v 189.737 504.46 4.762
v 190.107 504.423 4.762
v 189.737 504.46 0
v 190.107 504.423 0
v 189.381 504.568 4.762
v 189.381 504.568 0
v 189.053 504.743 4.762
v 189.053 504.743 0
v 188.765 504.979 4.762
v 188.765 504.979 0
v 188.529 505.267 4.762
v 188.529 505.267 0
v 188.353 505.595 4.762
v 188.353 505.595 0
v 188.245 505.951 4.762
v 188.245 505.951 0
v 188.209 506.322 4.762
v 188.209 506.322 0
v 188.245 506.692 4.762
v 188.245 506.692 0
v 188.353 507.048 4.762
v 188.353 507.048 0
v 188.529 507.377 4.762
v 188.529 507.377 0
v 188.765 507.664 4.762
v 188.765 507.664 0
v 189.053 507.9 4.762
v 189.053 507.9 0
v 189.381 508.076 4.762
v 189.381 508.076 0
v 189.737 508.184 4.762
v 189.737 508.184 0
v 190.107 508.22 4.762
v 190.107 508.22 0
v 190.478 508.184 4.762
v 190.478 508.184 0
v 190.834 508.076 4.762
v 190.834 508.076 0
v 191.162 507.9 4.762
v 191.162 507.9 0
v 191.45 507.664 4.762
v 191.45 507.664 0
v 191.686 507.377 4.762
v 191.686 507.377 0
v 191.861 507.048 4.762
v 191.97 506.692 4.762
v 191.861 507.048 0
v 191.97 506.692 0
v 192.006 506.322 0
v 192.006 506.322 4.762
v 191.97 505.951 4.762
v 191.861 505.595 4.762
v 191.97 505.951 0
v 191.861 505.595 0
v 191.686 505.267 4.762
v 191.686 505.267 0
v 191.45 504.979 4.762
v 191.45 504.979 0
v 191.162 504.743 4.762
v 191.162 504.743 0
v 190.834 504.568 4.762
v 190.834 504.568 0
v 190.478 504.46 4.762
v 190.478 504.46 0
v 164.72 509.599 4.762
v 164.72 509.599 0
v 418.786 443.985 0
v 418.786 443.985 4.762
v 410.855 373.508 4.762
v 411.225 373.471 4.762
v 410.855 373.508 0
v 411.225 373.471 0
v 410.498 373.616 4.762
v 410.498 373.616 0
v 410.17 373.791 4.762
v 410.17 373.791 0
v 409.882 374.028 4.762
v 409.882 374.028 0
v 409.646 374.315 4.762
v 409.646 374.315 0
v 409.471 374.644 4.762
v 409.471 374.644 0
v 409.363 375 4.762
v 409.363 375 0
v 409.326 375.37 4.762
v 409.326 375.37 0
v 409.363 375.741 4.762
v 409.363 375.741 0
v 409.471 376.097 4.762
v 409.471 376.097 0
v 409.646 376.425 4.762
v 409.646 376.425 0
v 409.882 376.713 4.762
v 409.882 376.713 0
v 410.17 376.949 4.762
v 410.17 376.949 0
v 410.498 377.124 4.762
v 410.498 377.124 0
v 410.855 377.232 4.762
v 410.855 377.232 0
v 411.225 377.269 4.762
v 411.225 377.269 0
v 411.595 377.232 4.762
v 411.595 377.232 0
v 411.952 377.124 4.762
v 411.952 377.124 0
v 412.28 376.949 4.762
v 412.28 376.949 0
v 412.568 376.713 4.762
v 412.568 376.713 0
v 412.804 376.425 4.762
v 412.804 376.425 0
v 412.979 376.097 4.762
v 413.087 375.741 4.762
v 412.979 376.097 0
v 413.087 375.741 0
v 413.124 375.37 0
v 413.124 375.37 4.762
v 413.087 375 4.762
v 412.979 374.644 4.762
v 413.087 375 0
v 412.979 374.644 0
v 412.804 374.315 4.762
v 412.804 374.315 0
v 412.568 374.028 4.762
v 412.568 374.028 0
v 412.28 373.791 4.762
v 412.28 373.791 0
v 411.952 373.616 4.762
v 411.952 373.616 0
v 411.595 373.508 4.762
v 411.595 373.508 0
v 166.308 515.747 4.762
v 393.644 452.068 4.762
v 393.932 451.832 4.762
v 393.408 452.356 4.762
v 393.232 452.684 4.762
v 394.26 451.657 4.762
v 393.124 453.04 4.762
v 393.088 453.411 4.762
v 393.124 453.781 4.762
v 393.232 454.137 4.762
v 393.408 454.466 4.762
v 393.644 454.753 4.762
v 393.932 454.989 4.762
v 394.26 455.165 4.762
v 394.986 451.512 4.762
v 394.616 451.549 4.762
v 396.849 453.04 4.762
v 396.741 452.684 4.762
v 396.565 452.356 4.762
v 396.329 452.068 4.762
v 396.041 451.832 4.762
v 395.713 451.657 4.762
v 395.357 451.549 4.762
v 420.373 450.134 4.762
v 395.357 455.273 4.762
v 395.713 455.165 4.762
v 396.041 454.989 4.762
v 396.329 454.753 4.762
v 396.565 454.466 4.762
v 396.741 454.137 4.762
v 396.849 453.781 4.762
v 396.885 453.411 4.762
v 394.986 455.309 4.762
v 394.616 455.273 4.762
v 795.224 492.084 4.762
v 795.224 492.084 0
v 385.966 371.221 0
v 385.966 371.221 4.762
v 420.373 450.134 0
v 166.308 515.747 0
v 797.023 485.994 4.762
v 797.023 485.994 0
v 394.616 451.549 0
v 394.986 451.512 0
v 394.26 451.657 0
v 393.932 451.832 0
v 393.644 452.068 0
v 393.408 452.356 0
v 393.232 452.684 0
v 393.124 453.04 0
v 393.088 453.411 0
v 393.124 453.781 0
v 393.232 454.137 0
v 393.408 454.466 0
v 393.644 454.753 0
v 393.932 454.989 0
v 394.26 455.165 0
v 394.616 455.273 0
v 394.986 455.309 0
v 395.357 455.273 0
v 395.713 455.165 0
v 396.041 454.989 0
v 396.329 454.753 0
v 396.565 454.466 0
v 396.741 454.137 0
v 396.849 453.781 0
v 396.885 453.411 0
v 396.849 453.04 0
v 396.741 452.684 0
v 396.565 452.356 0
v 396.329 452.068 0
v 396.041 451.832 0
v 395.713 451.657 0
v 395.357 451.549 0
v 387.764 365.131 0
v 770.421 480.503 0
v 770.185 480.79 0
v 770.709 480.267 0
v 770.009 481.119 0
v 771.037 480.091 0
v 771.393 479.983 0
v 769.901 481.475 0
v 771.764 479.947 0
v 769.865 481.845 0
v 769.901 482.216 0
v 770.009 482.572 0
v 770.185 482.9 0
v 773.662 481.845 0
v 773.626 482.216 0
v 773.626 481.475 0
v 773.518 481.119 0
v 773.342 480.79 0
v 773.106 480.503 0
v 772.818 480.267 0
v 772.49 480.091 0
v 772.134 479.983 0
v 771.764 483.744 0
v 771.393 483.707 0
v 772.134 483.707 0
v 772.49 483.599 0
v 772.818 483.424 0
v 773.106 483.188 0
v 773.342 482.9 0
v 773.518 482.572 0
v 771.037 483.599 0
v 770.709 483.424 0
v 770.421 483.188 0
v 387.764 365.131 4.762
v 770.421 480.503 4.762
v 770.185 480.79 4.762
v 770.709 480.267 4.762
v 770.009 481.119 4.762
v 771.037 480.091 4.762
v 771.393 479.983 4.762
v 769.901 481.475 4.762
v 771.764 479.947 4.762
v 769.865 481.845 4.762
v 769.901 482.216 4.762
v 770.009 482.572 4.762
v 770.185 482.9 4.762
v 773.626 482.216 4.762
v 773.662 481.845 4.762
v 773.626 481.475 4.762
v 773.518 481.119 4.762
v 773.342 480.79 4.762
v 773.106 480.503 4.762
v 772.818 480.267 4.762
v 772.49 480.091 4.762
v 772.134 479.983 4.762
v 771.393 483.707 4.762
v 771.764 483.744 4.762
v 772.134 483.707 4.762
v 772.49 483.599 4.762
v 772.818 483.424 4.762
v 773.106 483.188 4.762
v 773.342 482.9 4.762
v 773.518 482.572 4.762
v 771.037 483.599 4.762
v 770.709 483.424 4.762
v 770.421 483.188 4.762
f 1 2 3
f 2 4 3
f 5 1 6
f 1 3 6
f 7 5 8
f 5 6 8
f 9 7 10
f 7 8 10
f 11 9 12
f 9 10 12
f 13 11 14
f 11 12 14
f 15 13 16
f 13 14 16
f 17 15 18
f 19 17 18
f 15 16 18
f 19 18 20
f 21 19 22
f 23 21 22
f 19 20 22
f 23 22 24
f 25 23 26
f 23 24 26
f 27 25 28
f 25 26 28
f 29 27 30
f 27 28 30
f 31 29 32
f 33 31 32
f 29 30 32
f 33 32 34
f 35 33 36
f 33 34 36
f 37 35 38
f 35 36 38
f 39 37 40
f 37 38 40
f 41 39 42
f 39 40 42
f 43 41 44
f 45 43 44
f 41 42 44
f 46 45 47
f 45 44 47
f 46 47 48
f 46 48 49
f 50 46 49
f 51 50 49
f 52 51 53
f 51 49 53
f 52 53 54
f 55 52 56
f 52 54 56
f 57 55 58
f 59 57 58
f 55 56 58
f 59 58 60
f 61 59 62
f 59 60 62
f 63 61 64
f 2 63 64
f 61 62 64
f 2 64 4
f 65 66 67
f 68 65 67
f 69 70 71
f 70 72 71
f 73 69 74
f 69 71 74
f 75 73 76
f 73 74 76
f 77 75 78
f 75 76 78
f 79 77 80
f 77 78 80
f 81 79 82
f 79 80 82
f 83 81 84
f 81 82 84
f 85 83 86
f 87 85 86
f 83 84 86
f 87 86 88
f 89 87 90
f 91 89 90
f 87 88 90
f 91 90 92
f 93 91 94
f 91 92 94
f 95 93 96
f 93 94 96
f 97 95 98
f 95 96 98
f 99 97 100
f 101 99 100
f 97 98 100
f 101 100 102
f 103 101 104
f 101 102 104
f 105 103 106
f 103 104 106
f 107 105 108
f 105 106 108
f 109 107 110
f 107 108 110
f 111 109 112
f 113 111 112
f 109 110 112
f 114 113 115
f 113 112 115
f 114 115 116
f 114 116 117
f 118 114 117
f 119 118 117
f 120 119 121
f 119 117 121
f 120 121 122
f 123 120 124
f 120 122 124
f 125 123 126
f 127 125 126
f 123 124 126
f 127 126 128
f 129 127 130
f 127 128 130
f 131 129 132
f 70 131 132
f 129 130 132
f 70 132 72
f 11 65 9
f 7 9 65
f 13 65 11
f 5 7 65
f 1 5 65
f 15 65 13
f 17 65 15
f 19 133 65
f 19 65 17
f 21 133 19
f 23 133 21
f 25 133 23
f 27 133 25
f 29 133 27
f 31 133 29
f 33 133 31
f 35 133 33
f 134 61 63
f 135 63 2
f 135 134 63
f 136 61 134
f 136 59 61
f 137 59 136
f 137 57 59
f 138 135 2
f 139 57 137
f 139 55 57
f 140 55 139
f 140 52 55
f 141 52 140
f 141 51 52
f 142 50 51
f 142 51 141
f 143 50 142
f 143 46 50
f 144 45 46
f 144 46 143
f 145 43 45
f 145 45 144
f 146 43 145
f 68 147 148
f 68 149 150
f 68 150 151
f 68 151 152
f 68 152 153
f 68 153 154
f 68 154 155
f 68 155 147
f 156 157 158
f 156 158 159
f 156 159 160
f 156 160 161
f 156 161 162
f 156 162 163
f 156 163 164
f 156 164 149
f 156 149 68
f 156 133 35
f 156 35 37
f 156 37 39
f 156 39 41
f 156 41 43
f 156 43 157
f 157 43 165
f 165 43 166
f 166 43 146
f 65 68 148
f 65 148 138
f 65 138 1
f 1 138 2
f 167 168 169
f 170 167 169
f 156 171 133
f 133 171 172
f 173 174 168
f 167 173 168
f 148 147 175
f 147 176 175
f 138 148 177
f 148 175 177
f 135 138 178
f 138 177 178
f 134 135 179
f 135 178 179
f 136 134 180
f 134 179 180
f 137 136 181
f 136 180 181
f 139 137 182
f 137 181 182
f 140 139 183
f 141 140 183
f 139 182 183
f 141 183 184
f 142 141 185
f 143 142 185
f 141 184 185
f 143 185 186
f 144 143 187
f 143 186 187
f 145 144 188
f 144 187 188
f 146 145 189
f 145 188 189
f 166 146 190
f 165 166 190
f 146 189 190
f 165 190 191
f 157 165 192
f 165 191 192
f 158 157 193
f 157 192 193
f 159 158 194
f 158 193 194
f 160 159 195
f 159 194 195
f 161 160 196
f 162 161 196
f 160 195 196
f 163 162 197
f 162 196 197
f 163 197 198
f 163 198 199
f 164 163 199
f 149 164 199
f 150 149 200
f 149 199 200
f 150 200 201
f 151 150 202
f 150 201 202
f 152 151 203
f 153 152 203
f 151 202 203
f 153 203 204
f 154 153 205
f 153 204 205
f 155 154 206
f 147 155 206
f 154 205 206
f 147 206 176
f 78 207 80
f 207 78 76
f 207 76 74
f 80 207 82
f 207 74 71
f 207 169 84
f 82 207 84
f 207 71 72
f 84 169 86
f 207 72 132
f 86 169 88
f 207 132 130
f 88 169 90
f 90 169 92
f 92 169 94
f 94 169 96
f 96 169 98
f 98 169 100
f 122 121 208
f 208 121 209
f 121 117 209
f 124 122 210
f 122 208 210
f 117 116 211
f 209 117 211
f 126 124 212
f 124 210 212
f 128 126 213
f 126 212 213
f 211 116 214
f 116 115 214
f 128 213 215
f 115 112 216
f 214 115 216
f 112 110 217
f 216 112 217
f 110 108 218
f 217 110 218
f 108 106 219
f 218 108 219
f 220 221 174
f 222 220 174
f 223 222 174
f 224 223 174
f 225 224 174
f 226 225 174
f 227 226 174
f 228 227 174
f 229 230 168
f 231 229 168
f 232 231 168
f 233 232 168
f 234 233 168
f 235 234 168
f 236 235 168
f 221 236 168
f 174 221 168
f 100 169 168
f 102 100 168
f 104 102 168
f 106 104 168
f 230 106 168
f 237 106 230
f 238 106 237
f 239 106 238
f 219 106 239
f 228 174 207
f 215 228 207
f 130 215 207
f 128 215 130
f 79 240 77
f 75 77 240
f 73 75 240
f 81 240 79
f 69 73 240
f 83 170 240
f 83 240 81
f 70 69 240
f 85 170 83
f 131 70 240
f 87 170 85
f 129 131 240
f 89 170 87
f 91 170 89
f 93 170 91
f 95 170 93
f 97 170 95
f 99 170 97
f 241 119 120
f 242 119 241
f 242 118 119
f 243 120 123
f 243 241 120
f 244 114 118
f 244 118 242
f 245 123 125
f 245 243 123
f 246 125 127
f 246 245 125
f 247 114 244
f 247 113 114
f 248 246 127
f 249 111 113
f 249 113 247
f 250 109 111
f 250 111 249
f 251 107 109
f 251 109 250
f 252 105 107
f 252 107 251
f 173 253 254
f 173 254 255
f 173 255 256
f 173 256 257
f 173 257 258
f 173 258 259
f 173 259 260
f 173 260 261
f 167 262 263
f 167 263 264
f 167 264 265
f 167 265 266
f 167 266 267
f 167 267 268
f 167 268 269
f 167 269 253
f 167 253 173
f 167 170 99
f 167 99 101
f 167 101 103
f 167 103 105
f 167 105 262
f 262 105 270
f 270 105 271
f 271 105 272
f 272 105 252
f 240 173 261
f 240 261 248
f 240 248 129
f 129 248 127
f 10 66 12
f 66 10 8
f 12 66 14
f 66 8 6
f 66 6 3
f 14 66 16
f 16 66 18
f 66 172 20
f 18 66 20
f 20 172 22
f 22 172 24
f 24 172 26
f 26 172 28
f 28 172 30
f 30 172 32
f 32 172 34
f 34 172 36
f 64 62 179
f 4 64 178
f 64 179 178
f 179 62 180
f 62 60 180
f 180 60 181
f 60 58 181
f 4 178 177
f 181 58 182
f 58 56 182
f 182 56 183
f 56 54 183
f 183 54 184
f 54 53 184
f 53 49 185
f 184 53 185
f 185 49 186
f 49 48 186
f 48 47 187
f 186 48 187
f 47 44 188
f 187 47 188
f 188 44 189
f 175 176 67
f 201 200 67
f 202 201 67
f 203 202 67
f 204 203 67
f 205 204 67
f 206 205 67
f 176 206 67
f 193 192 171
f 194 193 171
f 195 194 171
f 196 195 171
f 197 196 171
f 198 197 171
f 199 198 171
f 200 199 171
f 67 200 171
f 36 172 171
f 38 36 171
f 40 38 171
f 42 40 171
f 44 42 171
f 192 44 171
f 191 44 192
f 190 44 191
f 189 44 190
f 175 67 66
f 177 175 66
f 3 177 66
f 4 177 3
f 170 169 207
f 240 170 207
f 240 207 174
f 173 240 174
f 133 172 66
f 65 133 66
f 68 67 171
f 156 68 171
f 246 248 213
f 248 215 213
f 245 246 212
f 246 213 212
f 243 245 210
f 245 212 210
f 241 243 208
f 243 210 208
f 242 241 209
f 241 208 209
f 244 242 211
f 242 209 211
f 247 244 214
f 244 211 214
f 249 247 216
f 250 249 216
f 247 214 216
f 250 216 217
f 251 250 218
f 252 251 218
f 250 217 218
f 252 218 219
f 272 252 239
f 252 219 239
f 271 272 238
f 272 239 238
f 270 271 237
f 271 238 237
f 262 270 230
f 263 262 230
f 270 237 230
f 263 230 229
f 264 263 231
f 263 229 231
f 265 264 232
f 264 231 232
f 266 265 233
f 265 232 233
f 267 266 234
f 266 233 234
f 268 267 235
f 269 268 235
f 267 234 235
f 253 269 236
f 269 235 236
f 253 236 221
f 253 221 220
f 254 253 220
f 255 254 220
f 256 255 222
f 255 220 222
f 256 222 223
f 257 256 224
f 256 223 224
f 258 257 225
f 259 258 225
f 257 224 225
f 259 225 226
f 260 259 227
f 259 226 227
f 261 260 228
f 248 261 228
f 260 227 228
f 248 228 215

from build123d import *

# Parameters (mm, degrees)
BOSS_EXTRUDE1_DEPTH            = 4.7625
BOSS_EXTRUDE1_2_DEPTH          = 4.7625
SKETCH6_W                      = 1.89865
SKETCH6_H                      = 4.7625
F_6_CLEARANCE_HOLE1_AT_2_COUNT = 2
F_6_CLEARANCE_HOLE1_AT_2_PITCH = 377.84858633
F_6_CLEARANCE_HOLE1_AT_3_COUNT = 2
F_6_CLEARANCE_HOLE1_AT_3_PITCH = 582.170968688
F_6_CLEARANCE_HOLE1_AT_4_COUNT = 2
F_6_CLEARANCE_HOLE1_AT_4_PITCH = 375.932176835


with BuildPart() as part:
    # Sketch4 → Boss-Extrude1 (new body)
    with BuildSketch(Plane.XY):
        Polygon((420.373410583, 450.13359804), (166.308154013, 515.747181299), (164.720331493, 509.598903521), (418.785588063, 443.985320261), align=None)
    extrude(amount=BOSS_EXTRUDE1_DEPTH)


with BuildPart() as body_2:
    # Sketch4 → Boss-Extrude1 2 (new body)
    with BuildSketch(Plane.XY):
        Polygon((795.224225991, 492.084261956), (385.965820385, 371.221082339), (387.764328284, 365.131101277), (797.022733889, 485.994280894), align=None)
    extrude(amount=BOSS_EXTRUDE1_2_DEPTH)

    # Sketch6 → #6 Clearance Hole1 (revolve, cut)
    with BuildSketch(Plane(origin=(771.763555691, 481.845239831, 4.7625), x_dir=(0, -1, 0), z_dir=(1, 0, 0))):
        with Locations((0.949325, 2.38125)):
            Rectangle(SKETCH6_W, SKETCH6_H)
    f_6_clearance_hole1 = revolve(axis=Axis((771.763555691, 481.845239831, 11.1125), (0, 0, -1)), mode=Mode.SUBTRACT)

    # #6 Clearance Hole1 at 4: #6 Clearance Hole1 ×2
    with Locations(*[Vector(-0.959052136, -0.28322959, 0) * (i * F_6_CLEARANCE_HOLE1_AT_4_PITCH) for i in range(1, F_6_CLEARANCE_HOLE1_AT_4_COUNT)]):
        add(f_6_clearance_hole1, mode=Mode.SUBTRACT)


with BuildPart() as part_1:
    add(part.part)

    # #6 Clearance Hole1 at 2: #6 Clearance Hole1 ×2
    with Locations(*[Vector(-0.997164423, -0.075253664, 0) * (i * F_6_CLEARANCE_HOLE1_AT_2_PITCH) for i in range(1, F_6_CLEARANCE_HOLE1_AT_2_COUNT)]):
        add(f_6_clearance_hole1, mode=Mode.SUBTRACT)

    # #6 Clearance Hole1 at 3: #6 Clearance Hole1 ×2
    with Locations(*[Vector(-0.999115781, 0.042043513, 0) * (i * F_6_CLEARANCE_HOLE1_AT_3_PITCH) for i in range(1, F_6_CLEARANCE_HOLE1_AT_3_COUNT)]):
        add(f_6_clearance_hole1, mode=Mode.SUBTRACT)


solid = Compound([body_2.part, part_1.part])
